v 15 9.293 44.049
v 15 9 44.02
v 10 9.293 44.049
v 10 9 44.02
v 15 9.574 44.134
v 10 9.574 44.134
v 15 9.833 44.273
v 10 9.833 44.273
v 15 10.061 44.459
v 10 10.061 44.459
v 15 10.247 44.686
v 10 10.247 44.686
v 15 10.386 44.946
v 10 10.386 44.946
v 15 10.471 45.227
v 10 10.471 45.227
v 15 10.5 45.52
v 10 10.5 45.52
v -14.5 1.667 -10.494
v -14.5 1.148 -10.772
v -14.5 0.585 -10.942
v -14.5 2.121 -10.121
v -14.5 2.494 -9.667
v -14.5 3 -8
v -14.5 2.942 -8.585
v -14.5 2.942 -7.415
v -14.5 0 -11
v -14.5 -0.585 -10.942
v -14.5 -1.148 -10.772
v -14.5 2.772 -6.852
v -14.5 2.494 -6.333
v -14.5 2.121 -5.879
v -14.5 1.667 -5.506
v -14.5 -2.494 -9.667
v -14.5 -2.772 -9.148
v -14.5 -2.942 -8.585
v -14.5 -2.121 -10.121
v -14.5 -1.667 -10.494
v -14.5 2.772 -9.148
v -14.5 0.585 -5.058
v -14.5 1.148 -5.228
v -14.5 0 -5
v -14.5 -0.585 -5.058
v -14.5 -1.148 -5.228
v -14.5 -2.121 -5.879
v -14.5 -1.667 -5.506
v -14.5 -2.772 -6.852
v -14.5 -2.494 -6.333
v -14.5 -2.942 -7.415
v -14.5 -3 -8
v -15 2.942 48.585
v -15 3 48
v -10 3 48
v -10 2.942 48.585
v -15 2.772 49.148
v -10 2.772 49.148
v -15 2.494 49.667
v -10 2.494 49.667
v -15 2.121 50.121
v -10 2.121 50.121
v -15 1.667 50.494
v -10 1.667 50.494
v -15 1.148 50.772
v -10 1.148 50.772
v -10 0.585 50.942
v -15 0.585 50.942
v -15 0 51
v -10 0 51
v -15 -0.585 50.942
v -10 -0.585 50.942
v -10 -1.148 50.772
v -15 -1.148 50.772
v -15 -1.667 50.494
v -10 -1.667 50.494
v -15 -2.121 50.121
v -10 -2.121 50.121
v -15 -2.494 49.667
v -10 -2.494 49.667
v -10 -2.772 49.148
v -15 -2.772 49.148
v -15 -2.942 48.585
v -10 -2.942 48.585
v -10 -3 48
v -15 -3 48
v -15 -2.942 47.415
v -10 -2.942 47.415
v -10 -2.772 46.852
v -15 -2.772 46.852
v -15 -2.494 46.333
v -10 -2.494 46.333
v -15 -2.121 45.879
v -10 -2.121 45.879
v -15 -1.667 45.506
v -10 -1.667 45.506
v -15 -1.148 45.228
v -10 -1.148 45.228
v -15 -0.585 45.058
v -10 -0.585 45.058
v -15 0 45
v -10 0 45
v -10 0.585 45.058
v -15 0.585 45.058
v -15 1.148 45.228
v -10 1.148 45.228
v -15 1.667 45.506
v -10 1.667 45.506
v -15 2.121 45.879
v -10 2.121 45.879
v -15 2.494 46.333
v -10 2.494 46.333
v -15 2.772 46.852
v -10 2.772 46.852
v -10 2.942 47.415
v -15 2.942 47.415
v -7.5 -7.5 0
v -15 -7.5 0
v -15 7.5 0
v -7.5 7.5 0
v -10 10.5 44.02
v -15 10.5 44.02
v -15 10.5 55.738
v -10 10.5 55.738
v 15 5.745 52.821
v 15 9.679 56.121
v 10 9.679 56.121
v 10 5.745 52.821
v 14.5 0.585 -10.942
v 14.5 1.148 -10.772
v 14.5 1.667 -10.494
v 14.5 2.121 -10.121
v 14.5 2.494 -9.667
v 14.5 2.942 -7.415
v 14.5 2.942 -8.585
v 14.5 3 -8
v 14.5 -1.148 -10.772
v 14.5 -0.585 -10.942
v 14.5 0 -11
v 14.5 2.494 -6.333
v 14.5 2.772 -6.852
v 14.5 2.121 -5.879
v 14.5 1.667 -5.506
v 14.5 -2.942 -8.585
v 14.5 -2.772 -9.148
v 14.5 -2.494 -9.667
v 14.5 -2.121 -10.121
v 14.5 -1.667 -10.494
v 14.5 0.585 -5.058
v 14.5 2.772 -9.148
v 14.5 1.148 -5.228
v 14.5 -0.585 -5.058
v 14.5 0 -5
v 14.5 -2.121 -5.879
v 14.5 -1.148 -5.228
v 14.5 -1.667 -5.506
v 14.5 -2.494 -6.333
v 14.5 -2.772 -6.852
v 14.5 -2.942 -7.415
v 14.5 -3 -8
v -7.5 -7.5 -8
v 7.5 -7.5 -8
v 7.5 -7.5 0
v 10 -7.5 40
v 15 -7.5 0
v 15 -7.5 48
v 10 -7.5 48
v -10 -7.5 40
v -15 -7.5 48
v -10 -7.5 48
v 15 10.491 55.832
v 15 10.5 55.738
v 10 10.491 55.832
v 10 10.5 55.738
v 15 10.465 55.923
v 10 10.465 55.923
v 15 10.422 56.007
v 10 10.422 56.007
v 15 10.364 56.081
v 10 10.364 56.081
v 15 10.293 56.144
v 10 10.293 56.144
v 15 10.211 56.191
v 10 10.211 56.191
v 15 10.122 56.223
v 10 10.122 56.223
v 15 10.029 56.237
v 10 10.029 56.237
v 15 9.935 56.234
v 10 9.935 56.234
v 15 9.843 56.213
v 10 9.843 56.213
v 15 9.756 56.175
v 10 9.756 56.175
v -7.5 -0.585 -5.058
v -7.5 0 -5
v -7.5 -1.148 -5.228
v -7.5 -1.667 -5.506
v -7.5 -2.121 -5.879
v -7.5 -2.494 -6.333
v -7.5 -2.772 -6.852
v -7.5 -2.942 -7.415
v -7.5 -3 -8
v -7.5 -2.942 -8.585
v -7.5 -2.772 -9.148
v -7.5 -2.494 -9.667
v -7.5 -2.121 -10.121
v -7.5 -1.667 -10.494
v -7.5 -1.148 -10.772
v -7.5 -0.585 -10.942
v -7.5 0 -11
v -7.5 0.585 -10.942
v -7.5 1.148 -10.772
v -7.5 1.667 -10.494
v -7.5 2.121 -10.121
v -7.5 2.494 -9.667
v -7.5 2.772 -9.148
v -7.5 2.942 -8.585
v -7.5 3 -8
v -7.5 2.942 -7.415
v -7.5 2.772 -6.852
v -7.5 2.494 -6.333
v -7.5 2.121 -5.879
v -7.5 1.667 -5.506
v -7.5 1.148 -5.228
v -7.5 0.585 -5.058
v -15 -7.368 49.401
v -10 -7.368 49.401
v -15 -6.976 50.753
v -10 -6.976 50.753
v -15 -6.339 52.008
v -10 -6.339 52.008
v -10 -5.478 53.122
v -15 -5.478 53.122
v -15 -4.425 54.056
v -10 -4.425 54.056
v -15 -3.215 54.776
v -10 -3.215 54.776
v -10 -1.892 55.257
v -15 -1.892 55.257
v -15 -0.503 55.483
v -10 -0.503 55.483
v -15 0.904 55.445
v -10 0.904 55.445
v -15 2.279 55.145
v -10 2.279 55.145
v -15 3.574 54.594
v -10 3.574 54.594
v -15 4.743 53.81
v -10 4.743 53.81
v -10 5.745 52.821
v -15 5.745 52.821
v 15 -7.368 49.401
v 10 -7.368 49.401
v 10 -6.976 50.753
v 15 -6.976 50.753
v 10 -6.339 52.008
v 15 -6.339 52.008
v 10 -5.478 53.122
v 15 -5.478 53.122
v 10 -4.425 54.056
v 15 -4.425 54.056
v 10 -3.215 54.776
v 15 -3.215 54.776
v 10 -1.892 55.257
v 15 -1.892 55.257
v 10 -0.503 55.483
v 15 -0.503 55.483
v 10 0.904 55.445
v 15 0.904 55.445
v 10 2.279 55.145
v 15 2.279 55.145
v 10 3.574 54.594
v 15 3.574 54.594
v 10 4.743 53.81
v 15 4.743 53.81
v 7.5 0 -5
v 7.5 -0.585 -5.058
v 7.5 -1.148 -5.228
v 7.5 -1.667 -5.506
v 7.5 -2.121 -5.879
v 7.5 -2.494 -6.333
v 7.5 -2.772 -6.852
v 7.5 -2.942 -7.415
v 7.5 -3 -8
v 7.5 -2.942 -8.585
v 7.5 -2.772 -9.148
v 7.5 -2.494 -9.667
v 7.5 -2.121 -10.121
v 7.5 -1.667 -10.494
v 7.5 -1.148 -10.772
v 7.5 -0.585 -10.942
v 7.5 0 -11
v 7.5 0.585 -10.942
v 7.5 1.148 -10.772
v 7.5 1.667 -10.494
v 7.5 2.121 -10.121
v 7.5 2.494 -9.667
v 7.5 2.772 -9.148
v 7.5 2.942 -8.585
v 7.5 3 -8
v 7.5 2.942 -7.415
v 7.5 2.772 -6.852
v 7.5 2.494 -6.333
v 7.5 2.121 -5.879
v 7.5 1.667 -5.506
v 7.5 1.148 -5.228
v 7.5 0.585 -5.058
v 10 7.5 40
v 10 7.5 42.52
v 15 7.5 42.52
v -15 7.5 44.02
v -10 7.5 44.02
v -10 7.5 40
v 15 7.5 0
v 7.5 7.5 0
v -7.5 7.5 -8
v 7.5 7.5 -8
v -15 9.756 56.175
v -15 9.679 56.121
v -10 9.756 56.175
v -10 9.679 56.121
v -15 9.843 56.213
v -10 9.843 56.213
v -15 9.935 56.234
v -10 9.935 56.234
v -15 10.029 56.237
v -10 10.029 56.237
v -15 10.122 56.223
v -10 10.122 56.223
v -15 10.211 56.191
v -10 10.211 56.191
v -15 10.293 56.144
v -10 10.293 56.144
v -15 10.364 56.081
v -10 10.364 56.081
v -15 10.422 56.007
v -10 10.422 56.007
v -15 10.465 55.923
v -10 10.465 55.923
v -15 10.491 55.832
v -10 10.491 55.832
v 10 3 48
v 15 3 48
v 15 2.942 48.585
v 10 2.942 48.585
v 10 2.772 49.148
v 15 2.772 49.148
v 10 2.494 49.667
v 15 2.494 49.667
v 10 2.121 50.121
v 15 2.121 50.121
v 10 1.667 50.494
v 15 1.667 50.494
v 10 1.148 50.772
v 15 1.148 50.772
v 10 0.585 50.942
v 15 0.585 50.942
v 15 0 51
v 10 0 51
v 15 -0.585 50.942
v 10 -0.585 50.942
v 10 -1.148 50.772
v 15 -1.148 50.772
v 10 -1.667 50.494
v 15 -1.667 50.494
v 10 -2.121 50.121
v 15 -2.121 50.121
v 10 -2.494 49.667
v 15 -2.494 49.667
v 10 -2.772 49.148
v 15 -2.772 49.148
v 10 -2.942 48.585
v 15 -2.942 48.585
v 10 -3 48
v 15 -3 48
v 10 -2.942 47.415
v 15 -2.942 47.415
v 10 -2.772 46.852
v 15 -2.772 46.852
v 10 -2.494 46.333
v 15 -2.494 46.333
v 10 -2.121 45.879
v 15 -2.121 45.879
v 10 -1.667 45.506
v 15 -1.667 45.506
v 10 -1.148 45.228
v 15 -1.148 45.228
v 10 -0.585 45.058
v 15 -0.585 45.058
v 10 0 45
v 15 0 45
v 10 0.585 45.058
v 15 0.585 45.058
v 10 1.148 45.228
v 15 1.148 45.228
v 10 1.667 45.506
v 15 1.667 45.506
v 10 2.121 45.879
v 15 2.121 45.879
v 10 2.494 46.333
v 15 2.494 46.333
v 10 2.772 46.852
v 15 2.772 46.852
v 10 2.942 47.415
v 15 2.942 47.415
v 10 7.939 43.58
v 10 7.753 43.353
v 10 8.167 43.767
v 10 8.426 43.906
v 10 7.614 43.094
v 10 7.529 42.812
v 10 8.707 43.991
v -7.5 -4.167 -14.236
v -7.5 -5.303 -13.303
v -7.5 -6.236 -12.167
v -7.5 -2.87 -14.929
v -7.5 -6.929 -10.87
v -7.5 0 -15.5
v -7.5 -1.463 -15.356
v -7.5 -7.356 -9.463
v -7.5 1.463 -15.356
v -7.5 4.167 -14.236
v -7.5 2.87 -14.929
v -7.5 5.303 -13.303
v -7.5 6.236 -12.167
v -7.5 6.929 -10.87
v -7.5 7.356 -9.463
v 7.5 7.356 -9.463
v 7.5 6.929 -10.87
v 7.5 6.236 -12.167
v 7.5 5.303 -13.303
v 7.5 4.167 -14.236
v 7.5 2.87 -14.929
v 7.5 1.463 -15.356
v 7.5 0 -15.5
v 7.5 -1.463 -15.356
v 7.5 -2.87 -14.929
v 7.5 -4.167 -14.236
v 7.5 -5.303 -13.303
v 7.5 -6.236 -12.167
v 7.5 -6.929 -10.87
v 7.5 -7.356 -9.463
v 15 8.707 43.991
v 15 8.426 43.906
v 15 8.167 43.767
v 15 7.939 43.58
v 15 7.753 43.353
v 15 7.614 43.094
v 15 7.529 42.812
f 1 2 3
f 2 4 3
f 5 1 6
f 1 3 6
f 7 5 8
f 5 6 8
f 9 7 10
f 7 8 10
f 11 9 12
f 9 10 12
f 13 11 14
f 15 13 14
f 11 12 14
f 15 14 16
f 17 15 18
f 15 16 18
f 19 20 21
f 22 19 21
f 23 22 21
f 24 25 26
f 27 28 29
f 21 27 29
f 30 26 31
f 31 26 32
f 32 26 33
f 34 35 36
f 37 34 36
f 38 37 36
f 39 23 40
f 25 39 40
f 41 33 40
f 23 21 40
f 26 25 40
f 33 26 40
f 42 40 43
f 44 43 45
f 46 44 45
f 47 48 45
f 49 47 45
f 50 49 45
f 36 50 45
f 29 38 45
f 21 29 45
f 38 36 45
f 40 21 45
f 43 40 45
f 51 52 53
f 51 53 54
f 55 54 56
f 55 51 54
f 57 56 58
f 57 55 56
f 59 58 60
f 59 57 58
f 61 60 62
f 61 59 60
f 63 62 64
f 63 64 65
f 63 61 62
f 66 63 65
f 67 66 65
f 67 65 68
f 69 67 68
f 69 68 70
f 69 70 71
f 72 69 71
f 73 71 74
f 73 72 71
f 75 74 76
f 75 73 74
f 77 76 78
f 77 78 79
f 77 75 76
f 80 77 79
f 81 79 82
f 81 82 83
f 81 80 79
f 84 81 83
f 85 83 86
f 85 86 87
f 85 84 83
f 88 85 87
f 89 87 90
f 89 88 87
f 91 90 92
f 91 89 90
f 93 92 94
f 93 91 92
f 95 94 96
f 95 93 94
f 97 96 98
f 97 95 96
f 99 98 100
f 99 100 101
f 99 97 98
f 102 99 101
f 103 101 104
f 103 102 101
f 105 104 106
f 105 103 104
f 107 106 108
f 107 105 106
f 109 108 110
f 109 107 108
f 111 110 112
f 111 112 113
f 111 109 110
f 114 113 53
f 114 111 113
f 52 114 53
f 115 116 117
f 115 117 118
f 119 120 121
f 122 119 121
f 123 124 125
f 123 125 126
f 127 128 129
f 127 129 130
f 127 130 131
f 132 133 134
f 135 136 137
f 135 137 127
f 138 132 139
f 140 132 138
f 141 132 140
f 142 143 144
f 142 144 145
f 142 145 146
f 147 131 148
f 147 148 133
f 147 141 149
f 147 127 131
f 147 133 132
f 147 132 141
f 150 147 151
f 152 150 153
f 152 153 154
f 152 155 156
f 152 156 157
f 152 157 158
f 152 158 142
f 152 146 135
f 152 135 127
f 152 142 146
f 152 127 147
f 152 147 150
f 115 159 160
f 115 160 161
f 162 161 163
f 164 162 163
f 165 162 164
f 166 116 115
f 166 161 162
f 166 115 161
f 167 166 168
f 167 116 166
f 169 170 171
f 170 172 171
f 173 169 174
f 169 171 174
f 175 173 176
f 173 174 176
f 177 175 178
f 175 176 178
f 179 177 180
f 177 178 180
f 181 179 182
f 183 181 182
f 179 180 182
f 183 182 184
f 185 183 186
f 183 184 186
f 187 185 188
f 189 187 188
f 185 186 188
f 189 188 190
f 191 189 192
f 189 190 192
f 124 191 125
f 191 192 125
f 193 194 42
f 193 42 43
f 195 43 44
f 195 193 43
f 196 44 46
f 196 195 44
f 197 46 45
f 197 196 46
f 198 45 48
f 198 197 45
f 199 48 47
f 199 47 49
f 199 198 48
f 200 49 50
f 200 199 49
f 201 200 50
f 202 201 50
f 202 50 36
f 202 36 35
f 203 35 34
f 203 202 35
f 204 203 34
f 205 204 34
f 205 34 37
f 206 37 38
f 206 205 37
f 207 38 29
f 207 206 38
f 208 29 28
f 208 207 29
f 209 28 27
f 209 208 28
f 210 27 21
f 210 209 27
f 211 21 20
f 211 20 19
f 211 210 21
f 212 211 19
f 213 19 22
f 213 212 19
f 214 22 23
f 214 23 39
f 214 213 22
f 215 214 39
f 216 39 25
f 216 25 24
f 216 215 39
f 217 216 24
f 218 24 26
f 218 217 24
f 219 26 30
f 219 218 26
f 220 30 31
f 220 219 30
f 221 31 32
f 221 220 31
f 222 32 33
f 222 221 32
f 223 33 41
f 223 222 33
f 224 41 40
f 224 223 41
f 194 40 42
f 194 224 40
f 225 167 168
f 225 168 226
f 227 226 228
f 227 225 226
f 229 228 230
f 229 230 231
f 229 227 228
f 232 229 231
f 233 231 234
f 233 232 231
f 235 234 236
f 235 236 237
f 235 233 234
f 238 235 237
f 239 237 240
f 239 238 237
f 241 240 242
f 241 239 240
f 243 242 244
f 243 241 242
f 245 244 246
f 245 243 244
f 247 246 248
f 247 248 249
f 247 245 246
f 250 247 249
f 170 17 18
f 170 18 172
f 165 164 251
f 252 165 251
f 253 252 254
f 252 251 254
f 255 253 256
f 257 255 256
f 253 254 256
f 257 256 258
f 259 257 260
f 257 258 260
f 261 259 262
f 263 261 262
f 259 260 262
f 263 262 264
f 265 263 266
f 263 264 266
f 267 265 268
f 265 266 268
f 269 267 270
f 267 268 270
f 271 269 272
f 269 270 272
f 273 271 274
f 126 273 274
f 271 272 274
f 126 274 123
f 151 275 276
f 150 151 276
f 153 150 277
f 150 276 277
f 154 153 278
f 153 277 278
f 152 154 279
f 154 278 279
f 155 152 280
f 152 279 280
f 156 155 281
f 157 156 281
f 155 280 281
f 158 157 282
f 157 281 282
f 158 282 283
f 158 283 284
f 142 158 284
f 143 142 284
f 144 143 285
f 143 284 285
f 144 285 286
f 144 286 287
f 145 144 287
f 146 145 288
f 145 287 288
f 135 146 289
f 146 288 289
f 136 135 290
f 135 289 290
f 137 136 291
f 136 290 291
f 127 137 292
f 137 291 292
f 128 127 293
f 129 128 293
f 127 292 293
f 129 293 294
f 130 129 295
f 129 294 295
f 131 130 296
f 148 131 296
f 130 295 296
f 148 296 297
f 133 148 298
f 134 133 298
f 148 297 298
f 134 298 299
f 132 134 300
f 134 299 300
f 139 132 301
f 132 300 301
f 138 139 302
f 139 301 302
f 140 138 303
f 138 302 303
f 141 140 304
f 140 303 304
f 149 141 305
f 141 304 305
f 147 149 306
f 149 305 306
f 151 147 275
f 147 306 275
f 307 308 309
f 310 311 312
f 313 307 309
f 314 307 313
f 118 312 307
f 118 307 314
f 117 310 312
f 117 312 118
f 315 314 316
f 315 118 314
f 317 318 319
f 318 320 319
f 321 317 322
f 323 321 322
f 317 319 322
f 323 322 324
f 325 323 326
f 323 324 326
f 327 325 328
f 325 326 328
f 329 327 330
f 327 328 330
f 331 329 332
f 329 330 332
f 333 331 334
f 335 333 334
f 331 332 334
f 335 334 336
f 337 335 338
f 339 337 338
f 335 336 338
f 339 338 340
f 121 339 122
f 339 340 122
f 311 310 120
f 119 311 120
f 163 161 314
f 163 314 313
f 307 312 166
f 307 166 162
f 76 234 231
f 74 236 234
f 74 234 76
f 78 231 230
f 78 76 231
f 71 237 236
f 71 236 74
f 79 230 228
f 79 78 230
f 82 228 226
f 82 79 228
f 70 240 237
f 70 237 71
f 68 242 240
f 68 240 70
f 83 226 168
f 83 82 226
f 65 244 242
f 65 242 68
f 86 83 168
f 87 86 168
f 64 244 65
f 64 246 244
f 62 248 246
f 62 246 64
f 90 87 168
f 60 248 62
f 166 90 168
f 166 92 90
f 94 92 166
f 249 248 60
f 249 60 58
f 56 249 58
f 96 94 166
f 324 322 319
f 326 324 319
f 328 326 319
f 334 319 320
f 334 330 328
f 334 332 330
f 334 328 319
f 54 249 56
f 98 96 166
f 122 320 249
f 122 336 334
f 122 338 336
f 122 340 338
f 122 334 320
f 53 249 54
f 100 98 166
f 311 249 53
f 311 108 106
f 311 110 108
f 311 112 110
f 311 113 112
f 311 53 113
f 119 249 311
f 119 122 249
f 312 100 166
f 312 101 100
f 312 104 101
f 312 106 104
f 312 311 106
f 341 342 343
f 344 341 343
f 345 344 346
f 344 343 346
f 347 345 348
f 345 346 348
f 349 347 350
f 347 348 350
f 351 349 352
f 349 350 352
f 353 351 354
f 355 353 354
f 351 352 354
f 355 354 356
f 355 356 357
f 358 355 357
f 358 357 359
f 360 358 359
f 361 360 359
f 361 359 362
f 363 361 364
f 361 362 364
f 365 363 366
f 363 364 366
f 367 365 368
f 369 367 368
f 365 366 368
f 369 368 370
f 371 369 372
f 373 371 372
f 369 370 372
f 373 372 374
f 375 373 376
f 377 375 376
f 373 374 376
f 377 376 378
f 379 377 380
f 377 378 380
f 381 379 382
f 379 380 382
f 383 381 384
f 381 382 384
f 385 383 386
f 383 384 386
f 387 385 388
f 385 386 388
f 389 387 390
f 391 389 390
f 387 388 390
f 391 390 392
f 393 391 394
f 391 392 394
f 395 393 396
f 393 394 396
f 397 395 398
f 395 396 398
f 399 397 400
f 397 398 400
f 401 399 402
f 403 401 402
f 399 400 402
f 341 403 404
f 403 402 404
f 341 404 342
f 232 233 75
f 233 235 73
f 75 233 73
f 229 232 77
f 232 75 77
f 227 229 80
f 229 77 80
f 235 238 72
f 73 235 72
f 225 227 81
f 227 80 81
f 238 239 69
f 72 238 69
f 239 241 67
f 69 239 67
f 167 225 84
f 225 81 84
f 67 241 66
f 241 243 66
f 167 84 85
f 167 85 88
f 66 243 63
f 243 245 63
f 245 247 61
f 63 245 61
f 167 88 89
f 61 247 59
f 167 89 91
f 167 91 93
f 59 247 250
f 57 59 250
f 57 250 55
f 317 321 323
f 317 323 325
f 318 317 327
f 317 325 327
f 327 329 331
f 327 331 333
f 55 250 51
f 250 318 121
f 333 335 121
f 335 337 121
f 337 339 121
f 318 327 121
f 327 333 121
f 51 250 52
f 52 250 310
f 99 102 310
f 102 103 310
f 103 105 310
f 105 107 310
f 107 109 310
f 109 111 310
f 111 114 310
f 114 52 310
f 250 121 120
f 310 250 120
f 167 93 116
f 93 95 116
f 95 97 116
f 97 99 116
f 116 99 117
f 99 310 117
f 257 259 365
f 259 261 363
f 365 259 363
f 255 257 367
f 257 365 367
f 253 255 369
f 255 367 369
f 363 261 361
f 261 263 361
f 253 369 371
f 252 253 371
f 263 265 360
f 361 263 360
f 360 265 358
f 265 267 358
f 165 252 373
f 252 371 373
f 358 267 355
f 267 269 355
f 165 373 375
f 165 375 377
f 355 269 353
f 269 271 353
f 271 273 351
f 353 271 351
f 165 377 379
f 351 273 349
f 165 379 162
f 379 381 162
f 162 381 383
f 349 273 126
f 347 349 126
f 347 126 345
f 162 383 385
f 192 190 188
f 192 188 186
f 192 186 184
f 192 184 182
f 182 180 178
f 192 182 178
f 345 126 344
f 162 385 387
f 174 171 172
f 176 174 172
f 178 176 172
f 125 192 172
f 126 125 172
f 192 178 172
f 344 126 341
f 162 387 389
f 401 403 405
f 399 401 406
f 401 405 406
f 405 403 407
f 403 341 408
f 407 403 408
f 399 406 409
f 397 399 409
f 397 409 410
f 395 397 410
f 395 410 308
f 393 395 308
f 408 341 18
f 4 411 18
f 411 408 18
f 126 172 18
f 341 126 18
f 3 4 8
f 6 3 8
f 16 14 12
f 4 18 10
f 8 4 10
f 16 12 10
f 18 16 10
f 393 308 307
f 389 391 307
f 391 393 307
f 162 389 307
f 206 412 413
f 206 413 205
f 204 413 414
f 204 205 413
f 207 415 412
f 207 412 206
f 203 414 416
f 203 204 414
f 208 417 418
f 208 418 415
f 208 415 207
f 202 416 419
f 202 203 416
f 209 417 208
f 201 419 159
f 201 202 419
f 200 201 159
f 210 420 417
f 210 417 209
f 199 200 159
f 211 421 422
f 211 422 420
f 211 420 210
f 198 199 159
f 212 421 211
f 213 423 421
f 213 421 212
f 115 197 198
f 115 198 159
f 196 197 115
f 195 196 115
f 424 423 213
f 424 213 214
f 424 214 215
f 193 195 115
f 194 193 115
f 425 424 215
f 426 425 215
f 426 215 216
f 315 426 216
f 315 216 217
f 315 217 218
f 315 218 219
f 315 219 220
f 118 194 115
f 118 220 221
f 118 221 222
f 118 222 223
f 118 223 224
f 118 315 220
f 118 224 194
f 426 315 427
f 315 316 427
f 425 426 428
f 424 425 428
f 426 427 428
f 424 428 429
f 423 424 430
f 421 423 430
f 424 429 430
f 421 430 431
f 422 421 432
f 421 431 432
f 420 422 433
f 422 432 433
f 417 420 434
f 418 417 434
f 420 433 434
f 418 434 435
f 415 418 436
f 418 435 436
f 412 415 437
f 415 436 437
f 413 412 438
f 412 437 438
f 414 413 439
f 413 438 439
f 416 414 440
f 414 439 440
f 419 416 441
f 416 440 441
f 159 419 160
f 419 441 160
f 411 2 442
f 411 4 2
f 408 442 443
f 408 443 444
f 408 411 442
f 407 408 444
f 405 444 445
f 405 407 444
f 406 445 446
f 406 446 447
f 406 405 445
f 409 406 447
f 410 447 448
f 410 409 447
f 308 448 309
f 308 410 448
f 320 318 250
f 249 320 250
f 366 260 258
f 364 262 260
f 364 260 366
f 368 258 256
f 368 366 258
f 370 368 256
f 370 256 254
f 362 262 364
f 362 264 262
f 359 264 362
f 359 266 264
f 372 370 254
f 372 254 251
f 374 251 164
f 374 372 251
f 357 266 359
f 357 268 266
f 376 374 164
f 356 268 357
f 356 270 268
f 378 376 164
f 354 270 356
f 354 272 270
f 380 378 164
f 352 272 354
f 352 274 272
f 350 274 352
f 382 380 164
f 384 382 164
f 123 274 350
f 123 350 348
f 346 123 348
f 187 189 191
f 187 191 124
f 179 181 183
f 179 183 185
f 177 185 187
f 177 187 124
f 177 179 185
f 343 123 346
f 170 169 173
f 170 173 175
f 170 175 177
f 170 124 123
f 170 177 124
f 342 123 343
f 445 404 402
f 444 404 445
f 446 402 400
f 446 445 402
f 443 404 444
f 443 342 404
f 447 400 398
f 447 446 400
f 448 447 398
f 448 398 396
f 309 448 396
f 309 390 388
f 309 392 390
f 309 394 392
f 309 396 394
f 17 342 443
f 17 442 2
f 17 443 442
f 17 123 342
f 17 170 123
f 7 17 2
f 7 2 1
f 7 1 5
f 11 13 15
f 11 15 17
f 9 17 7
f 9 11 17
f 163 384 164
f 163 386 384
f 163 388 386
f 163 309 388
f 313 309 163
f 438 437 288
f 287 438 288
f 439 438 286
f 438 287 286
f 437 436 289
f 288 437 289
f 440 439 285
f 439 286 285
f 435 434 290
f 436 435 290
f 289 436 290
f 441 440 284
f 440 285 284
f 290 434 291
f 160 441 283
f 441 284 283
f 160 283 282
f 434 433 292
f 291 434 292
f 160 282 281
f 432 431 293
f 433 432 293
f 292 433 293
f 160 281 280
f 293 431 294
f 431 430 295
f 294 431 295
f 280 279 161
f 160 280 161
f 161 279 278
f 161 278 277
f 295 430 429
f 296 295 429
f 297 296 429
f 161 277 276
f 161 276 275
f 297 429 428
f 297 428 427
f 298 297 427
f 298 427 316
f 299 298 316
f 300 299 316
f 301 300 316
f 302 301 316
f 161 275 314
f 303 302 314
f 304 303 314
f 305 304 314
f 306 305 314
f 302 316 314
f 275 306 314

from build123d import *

# Parameters (mm, degrees)
SKETCH_1_W             = 30
SKETCH_1_H             = 15
EXTRUDE_1_DEPTH        = 40
EXTRUDE_2_DEPTH        = 5
SKETCH_3_R             = 3
CUT_EXTRUDE_1_DEPTH    = 5
EXTRUDE_3_DEPTH        = 7.5
SKETCH_7_R             = 3
EXTRUDE_4_DEPTH        = 7
EXTRUDE_5_DEPTH        = 5
FILLET_2_R             = 1.5
FILLET_3_R             = 0.5
FILLET_3_OF_MIRROR_3_R = 0.5


with BuildPart() as part:
    # 草图1 → 凸台-拉伸1 (new body)
    with BuildSketch(Plane.XY):
        Rectangle(SKETCH_1_W, SKETCH_1_H)
    extrude(amount=EXTRUDE_1_DEPTH)

    # 草图2 → 凸台-拉伸2 (add)
    with BuildSketch(Plane(origin=(15, 0, 0), x_dir=(0, 0, -1), z_dir=(1, 0, 0))):
        with BuildLine():
            Line((-40, -7.5), (-48, -7.5))
            ThreePointArc((-48, -7.5), (-55.5, 0), (-48, 7.5))
            Line((-48, 7.5), (-40, 7.5))
            Line((-40, 7.5), (-40, -7.5))
        make_face()
    extrude_2 = extrude(amount=-EXTRUDE_2_DEPTH)

    # 草图3 → 切除-拉伸1 (cut)
    with BuildSketch(Plane(origin=(15, 0, 0), x_dir=(0, 0, -1), z_dir=(1, 0, 0))):
        with Locations(Location((-48, 0, 0), (0, 0, 90))):
            Circle(SKETCH_3_R)
    cut_extrude_1 = extrude(amount=-CUT_EXTRUDE_1_DEPTH, mode=Mode.SUBTRACT)

    # 镜向1: 凸台-拉伸2, 切除-拉伸1 across plane
    add(extrude_2.mirror(Plane(origin=(0, 0, 0), x_dir=(0, 0, 1), z_dir=(1, 0, 0))))
    add(cut_extrude_1.mirror(Plane(origin=(0, 0, 0), x_dir=(0, 0, 1), z_dir=(1, 0, 0))), mode=Mode.SUBTRACT)

    # 草图6 → 凸台-拉伸3 (add, symmetric)
    with BuildSketch(Plane(origin=(0, 0, 0), x_dir=(0, 0, -1), z_dir=(1, 0, 0))):
        with BuildLine():
            Line((0, 7.5), (8, 7.5))
            ThreePointArc((8, 7.5), (15.5, 0), (8, -7.5))
            Line((8, -7.5), (0, -7.5))
            Line((0, -7.5), (0, 7.5))
        make_face()
    extrude(amount=EXTRUDE_3_DEPTH, both=True)

    # 草图7 → 凸台-拉伸4 (add)
    with BuildSketch(Plane(origin=(7.5, 0, 0), x_dir=(0, 0, -1), z_dir=(1, 0, 0))):
        with Locations(Location((8, 0, 0), (0, 0, 180))):
            Circle(SKETCH_7_R)
    extrude_4 = extrude(amount=EXTRUDE_4_DEPTH)

    # 镜向2: 凸台-拉伸4 across plane
    add(extrude_4.mirror(Plane(origin=(0, 0, 0), x_dir=(0, 0, 1), z_dir=(1, 0, 0))))

    # 草图8 → 凸台-拉伸5 (add)
    with BuildSketch(Plane(origin=(15, 0, 0), x_dir=(0, 0, -1), z_dir=(1, 0, 0))):
        with BuildLine():
            Line((-56.810546127, 10.5), (-52.820907073, 5.745333323))
            ThreePointArc((-52.820907073, 5.745333323), (-50.565151075, 7.047694656), (-48, 7.5))
            Line((-48, 7.5), (-44.01973259, 7.5))
            Line((-44.01973259, 7.5), (-44.01973259, 10.5))
            Line((-44.01973259, 10.5), (-56.810546127, 10.5))
        make_face()
    extrude_5 = extrude(amount=-EXTRUDE_5_DEPTH)

    # 圆角2
    fillet_2_edges = [part.edges().sort_by_distance(p)[0] for p in [
        (12.5, 7.5, 44.01973259),
    ]]
    fillet(fillet_2_edges, radius=FILLET_2_R)
    fillet_2_2_edges = [part.edges().sort_by_distance(p)[0] for p in [
        (12.5, 10.5, 44.01973259),
    ]]
    fillet(fillet_2_2_edges, radius=FILLET_2_R - 0.0001)  # a hair under: the kernel refuses the full size

    # 圆角3
    fillet_3_edges = [part.edges().sort_by_distance(p)[0] for p in [
        (12.5, 10.5, 56.810546127),
    ]]
    fillet(fillet_3_edges, radius=FILLET_3_R)

    # 镜向3: 凸台-拉伸5 across plane
    add(extrude_5.mirror(Plane(origin=(0, 0, 0), x_dir=(0, 0, 1), z_dir=(1, 0, 0))))

    # 圆角3 of 镜向3
    fillet_3_of_mirror_3_edges = [part.edges().sort_by_distance(p)[0] for p in [
        (-12.5, 10.5, 56.810546127),
    ]]
    fillet(fillet_3_of_mirror_3_edges, radius=FILLET_3_OF_MIRROR_3_R)


solid = part.part
